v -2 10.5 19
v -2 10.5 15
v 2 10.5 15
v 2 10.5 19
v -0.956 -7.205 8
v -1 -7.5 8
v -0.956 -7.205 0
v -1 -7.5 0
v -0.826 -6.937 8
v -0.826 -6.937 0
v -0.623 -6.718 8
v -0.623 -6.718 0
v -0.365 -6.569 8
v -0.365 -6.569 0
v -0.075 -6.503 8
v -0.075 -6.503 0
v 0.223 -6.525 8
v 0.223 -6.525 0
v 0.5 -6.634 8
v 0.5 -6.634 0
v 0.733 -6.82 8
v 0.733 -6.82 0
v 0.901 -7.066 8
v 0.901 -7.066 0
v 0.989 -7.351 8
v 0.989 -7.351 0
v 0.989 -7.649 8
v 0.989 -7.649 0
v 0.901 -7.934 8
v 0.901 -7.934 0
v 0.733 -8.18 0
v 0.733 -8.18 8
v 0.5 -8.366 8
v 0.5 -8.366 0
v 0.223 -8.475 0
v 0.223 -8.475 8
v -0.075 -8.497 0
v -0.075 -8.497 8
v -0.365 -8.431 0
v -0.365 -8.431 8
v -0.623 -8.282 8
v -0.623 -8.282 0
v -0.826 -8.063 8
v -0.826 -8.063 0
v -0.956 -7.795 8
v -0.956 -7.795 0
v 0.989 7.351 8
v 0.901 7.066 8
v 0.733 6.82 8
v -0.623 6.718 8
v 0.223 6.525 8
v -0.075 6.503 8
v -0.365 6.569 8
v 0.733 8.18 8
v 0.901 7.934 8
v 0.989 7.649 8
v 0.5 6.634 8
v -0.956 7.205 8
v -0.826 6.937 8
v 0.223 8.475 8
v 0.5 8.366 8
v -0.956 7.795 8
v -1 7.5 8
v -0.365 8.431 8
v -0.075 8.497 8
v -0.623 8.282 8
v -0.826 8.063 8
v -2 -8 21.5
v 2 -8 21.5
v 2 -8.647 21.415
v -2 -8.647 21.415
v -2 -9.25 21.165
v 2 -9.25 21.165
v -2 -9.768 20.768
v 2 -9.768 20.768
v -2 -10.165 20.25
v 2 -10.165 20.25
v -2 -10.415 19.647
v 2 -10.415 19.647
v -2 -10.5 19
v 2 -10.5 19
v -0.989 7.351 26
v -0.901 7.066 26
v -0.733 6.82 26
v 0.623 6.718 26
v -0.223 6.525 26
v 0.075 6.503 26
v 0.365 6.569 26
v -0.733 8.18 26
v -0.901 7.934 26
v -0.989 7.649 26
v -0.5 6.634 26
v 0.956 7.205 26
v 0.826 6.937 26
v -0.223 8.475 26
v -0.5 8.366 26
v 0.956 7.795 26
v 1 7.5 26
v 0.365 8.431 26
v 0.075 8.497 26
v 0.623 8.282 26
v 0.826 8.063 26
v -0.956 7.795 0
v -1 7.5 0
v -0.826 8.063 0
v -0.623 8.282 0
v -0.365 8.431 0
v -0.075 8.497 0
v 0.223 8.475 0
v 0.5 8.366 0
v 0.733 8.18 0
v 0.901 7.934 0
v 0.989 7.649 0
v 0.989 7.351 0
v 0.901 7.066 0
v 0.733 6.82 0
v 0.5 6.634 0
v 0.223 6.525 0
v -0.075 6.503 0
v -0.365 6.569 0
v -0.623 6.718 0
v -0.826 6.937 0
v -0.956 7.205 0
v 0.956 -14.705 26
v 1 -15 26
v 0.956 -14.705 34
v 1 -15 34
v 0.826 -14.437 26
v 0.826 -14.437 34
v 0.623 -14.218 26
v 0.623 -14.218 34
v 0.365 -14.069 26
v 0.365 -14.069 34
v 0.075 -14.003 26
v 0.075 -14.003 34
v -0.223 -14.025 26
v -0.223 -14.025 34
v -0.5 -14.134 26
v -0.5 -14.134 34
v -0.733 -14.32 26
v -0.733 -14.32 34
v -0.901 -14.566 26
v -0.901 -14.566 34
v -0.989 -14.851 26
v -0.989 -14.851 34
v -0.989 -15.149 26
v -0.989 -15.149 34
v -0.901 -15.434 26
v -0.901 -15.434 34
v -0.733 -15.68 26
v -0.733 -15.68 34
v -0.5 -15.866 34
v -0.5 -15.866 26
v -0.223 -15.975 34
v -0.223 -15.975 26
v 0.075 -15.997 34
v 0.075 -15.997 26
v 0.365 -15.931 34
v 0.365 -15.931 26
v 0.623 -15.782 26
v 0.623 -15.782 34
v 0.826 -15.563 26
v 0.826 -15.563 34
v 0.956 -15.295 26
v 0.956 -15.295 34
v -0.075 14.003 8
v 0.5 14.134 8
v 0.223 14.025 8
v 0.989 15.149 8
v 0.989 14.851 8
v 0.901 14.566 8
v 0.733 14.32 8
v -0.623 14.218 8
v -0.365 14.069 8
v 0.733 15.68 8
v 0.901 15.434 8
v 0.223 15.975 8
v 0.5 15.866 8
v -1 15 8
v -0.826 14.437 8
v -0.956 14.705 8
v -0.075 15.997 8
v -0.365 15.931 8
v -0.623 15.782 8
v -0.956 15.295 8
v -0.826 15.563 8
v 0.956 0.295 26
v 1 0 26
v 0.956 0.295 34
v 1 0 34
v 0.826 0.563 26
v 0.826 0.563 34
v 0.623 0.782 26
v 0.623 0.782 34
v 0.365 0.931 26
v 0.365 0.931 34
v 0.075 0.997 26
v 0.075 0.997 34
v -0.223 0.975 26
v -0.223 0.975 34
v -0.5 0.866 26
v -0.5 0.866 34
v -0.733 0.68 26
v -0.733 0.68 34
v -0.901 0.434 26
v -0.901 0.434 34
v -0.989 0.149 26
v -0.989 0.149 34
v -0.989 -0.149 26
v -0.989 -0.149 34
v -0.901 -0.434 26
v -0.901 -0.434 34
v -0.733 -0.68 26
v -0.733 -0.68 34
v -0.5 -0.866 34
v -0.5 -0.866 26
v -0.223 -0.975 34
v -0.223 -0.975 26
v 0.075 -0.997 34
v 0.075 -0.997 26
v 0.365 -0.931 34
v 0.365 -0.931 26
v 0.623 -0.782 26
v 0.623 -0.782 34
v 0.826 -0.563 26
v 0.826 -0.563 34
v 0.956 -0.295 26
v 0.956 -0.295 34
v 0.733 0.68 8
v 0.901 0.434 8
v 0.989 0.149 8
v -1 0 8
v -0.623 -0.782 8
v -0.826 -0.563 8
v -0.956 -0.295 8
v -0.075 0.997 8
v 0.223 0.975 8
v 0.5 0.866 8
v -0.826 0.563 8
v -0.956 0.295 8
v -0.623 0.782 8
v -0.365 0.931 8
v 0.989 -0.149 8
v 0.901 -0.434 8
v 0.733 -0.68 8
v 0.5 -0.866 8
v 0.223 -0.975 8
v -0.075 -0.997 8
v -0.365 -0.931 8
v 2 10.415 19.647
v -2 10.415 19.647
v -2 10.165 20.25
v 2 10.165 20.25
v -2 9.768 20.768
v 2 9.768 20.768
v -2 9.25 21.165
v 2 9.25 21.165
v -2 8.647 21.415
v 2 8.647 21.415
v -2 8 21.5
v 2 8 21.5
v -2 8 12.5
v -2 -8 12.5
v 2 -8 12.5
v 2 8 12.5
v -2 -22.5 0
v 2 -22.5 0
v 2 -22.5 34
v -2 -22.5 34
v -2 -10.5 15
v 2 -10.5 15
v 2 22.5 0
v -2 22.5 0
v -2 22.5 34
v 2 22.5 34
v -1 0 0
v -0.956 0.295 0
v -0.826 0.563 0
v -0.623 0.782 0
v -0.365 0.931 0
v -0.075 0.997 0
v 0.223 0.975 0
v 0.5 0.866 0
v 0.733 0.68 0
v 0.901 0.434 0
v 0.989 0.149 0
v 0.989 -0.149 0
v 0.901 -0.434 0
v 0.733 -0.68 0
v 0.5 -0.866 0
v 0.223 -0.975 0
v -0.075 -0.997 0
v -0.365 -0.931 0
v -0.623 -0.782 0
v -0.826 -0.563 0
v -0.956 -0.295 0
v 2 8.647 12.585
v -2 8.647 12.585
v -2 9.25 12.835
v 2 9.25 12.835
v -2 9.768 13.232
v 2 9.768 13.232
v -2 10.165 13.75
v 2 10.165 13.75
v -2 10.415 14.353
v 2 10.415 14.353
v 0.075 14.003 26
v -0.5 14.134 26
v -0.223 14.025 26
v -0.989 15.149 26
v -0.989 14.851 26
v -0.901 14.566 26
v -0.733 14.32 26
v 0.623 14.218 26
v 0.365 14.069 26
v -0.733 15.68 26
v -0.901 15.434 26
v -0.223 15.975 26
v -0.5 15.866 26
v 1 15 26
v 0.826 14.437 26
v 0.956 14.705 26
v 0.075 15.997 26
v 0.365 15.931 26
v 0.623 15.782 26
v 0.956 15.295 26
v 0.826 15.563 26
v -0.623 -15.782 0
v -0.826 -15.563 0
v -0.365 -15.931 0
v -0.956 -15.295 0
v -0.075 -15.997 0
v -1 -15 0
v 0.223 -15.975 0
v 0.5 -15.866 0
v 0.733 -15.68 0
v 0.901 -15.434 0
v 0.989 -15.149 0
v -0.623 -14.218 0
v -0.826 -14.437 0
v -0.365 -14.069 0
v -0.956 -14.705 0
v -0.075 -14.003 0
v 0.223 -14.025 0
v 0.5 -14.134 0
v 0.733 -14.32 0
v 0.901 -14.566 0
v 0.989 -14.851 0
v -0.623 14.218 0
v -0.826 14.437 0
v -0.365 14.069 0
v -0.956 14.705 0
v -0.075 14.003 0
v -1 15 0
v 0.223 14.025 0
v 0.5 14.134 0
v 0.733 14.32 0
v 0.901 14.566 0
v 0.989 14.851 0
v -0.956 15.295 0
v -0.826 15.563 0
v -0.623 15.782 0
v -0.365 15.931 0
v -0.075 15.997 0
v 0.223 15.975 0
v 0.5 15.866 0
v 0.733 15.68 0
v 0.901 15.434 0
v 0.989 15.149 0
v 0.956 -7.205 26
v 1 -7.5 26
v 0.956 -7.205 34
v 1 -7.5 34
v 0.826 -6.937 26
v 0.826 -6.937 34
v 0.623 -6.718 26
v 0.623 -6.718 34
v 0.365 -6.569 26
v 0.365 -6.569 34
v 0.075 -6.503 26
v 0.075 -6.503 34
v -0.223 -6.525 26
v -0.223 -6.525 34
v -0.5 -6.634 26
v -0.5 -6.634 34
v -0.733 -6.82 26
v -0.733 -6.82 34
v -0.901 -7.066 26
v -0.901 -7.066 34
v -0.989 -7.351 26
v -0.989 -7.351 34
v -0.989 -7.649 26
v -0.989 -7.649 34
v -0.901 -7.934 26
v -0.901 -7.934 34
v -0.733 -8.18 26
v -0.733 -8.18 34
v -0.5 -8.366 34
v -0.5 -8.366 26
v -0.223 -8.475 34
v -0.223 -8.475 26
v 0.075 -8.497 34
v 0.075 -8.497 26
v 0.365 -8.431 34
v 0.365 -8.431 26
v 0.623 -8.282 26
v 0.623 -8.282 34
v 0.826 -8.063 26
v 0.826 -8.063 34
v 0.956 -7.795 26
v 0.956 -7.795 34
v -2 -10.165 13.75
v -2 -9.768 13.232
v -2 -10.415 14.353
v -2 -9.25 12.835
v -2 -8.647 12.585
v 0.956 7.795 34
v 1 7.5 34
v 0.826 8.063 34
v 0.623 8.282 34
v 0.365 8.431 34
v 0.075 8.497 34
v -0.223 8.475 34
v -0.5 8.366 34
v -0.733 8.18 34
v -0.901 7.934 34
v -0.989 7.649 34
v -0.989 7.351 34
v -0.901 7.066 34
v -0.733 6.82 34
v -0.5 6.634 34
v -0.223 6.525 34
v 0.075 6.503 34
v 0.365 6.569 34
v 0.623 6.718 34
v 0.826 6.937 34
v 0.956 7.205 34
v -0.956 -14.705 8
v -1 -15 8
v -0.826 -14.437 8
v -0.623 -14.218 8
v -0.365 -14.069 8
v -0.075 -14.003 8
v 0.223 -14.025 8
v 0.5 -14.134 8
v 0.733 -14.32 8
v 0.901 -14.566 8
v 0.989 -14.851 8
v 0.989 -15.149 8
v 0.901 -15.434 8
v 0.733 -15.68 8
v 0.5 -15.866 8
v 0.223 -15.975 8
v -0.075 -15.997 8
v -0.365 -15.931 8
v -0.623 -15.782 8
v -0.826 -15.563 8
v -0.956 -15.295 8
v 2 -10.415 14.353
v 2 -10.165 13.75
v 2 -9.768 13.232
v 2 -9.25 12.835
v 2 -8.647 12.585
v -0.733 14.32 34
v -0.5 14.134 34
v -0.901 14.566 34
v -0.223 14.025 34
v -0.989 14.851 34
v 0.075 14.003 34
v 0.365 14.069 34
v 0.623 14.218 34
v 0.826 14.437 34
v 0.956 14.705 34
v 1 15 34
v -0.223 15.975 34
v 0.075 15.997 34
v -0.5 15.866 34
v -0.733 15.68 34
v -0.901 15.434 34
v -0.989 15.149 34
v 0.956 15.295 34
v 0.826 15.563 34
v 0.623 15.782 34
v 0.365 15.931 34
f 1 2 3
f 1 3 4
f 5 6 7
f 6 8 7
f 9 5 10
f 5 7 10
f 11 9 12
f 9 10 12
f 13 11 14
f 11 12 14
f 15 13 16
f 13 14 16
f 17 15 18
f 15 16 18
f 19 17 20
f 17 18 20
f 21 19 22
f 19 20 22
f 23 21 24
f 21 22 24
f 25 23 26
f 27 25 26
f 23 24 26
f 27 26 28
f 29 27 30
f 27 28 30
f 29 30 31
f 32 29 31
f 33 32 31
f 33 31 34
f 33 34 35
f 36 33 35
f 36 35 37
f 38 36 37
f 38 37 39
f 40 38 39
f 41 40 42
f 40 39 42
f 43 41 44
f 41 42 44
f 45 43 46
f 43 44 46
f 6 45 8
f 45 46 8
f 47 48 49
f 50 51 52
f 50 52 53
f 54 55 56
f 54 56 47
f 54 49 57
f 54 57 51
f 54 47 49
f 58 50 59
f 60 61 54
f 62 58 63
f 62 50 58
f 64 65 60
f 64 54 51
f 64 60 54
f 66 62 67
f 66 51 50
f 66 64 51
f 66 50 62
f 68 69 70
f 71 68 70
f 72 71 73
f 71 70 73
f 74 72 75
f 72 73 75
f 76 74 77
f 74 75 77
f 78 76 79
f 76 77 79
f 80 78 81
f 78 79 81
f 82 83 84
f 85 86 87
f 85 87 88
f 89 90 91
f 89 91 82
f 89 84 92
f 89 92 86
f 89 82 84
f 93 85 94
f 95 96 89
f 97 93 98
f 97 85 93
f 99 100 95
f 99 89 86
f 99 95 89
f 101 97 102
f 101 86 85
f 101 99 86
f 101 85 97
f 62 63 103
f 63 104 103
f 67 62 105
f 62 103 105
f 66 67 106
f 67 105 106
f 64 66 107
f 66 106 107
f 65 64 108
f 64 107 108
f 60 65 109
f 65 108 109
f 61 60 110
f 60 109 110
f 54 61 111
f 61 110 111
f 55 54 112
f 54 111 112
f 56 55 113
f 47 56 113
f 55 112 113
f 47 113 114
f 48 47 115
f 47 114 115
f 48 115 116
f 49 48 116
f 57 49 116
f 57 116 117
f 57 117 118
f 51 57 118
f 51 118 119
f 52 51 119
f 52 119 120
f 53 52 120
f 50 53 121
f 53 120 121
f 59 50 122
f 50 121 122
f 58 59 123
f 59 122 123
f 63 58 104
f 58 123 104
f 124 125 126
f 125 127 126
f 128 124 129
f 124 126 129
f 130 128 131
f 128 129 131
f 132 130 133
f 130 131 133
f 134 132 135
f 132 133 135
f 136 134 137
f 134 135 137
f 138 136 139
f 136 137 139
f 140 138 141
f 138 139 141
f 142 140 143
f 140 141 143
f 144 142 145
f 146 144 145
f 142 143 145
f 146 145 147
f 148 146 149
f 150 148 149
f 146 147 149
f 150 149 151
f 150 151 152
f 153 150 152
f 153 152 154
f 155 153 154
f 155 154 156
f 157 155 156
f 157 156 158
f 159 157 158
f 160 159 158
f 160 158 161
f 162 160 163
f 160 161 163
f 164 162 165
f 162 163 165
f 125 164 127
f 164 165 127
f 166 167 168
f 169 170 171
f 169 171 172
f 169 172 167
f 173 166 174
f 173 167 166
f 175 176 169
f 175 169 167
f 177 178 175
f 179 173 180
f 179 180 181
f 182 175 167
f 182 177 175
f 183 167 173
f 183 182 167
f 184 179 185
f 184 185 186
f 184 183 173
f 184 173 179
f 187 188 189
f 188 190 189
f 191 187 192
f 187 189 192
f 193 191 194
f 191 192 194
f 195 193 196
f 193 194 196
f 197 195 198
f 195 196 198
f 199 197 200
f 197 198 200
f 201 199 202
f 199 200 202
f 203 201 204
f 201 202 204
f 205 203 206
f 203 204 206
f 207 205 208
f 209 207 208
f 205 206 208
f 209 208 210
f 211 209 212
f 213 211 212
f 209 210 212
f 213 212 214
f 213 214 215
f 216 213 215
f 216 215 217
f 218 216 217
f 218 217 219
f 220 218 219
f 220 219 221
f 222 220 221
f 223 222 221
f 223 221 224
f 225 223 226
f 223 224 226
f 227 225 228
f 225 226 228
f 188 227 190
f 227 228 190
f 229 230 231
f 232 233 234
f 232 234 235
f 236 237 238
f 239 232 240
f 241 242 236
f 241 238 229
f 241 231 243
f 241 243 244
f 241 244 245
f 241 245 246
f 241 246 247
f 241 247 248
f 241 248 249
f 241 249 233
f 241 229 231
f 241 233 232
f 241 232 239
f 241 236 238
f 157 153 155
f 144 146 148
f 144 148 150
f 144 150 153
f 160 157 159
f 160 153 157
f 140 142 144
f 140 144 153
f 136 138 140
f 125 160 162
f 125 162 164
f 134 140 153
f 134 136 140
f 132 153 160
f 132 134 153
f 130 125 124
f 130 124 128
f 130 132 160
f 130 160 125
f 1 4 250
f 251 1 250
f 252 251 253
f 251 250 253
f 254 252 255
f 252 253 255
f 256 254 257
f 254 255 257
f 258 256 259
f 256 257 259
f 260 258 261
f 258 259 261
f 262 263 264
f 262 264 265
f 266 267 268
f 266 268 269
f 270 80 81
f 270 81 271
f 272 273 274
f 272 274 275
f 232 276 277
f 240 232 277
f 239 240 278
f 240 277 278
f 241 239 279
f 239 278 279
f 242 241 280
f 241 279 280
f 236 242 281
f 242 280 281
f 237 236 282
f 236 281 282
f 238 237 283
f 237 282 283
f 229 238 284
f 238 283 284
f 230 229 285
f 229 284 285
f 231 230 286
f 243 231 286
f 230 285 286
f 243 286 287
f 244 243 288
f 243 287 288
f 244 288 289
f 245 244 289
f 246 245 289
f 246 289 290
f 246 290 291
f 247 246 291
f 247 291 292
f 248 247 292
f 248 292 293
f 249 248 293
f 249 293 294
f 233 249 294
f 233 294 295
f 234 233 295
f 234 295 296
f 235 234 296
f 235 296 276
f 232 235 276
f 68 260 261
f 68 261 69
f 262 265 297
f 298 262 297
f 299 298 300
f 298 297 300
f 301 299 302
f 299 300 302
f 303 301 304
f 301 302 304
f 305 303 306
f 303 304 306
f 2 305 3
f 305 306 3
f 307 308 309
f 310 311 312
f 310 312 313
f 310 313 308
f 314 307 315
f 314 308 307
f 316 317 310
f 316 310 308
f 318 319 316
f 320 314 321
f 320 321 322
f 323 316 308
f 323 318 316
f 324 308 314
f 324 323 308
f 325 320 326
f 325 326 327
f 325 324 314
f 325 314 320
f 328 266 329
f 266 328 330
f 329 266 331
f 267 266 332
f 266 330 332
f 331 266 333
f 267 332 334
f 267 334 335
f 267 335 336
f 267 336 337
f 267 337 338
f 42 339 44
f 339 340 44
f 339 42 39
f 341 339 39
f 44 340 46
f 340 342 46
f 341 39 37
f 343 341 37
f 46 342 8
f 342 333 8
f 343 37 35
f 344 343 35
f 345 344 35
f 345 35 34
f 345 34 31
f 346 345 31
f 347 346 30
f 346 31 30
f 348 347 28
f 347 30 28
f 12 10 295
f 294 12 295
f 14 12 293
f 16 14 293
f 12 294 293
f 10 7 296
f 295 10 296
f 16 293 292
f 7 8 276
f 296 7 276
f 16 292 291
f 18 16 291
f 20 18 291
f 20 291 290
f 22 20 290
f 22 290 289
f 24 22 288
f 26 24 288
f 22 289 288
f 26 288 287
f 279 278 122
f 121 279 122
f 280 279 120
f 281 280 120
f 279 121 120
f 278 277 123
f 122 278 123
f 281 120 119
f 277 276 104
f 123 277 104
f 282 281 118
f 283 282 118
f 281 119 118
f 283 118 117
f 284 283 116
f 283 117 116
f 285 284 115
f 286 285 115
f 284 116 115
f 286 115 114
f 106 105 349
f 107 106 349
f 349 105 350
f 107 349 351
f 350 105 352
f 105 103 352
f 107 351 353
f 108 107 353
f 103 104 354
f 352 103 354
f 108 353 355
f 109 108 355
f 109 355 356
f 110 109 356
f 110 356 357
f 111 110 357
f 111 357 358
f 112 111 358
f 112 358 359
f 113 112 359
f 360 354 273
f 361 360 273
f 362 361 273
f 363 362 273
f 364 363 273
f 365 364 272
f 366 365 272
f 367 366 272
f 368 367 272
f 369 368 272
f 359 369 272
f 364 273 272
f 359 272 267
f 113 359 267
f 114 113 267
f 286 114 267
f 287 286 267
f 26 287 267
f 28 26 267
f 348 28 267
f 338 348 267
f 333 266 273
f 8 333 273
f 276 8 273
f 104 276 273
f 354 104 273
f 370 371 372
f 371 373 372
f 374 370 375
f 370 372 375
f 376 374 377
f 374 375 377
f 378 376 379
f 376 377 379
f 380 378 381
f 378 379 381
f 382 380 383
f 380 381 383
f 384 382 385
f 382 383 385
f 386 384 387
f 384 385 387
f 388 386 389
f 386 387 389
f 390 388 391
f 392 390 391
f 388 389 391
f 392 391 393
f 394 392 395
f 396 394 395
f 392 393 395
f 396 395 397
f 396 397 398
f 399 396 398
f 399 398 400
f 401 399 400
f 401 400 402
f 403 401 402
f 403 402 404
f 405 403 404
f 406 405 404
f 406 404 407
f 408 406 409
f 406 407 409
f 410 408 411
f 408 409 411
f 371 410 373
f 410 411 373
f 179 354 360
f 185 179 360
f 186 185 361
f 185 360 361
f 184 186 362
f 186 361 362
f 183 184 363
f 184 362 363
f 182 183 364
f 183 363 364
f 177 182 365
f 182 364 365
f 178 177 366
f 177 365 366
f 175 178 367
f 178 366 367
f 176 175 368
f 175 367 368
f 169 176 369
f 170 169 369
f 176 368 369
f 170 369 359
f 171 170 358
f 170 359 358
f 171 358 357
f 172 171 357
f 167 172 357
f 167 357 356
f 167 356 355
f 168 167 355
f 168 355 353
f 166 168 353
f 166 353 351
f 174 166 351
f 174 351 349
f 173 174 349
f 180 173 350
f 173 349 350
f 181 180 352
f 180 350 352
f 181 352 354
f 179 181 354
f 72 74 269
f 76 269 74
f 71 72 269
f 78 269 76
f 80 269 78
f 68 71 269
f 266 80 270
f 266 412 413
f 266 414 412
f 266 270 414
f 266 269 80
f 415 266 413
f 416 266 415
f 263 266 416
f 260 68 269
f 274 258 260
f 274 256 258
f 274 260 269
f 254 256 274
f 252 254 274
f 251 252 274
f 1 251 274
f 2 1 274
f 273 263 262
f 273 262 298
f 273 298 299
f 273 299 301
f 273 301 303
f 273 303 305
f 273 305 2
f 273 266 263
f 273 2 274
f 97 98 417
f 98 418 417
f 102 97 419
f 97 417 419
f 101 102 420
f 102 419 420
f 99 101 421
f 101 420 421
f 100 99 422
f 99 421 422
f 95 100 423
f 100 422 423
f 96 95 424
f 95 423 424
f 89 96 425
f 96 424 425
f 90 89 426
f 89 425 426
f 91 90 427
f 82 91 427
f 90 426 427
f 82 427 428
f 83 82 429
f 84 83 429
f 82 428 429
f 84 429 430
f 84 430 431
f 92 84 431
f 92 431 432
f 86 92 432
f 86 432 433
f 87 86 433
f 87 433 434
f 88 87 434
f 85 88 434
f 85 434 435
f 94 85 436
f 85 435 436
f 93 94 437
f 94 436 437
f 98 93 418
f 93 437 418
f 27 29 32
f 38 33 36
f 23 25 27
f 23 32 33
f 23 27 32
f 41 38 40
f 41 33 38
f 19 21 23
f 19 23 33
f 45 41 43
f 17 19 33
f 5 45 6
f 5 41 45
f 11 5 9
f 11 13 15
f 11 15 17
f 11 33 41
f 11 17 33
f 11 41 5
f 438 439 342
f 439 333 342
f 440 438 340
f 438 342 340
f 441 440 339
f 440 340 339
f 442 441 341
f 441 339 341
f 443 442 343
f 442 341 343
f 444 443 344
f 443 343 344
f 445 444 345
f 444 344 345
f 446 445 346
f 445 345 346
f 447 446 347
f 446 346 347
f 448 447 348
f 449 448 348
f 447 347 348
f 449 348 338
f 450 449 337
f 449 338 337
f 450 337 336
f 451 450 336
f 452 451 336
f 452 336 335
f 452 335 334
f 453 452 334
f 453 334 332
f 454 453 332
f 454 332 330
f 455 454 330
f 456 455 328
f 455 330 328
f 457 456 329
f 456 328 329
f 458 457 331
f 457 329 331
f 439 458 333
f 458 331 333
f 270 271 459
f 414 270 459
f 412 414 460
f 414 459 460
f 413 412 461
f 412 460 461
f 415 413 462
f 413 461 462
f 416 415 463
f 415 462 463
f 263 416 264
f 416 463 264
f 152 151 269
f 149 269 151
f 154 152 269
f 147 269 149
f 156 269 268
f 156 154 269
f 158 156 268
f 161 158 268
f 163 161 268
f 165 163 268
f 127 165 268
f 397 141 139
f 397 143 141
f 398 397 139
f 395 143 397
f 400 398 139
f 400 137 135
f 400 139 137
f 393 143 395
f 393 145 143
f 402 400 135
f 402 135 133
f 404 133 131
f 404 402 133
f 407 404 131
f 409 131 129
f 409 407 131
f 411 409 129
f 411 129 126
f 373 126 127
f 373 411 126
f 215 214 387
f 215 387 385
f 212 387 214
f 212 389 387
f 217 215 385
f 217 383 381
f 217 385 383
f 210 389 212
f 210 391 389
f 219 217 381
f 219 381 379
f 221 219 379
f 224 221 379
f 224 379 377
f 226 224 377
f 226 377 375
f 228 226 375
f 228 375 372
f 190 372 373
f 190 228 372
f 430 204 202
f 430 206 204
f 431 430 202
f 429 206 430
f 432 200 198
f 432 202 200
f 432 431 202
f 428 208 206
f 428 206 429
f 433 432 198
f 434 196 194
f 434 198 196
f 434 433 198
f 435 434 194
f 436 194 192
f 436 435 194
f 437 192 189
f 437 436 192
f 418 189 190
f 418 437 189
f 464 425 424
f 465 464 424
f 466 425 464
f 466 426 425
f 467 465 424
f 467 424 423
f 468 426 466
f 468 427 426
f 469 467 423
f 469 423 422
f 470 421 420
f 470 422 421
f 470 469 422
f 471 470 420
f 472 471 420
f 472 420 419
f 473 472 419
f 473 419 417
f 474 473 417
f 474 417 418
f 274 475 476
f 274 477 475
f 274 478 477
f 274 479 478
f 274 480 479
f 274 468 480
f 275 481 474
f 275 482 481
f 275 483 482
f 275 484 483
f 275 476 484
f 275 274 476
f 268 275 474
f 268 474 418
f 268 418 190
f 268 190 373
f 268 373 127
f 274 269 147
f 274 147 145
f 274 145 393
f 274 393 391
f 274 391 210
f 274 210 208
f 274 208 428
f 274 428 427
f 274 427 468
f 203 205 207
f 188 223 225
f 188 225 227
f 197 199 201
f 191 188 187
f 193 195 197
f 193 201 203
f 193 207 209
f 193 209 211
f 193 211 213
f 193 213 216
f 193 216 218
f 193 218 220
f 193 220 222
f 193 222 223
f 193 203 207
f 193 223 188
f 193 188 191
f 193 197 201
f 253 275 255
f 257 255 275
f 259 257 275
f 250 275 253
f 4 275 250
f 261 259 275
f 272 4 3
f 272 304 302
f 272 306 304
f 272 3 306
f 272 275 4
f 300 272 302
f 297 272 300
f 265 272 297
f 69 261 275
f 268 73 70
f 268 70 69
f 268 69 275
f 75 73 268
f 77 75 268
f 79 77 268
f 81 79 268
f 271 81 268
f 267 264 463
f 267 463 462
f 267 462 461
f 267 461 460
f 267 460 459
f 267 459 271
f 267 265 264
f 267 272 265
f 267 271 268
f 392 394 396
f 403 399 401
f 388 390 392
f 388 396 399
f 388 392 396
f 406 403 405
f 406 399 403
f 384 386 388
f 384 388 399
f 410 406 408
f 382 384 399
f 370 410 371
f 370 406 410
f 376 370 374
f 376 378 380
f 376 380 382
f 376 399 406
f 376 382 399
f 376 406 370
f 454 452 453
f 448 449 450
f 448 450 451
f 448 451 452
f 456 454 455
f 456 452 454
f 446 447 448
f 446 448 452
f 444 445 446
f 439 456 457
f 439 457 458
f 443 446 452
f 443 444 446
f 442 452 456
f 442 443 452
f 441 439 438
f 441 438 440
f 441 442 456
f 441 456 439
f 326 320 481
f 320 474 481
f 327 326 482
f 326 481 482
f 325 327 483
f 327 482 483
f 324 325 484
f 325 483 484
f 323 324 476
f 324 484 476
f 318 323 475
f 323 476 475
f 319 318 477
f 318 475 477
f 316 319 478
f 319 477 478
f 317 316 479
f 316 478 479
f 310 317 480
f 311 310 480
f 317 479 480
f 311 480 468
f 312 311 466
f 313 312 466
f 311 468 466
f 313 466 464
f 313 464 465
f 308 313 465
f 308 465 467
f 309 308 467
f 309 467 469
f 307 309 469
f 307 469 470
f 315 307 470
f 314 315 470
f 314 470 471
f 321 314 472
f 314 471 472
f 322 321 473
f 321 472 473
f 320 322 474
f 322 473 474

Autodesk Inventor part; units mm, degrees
ref_plane "YZ Plane" through (0, 0, 0) normal (1, 0, 0) x (0, 1, 0)
ref_plane "XZ Plane" through (0, 0, 0) normal (0, 1, 0) x (-1, 0, 0)
ref_plane "XY Plane" through (0, 0, 0) normal (0, 0, 1) x (1, 0, 0)
sketch "스케치1" plane through (0, 0, 0) normal (0, 0, 1) x (1, 0, 0)
  line L0 (-2, 22.5) -> (2, 22.5)
  line L1 (2, 22.5) -> (2, -22.5)
  line L2 (2, -22.5) -> (-2, -22.5)
  line L3 (-2, -22.5) -> (-2, 22.5)
  point P0 (0, 0)
  dimension "d0" = 4
  dimension "d1" = 45
  dimension "d2" = 2
  dimension "d3" = 22.5
extrude "돌출1" add sketch "스케치1" along normal blind 34
sketch "스케치2" plane through (0, 0, 34) normal (0, 0, 1) x (1, 0, 0)
  circle A0 centre (0, 15) radius 1
  circle A1 centre (0, 7.5) radius 1
  circle A2 centre (0, -7.5) radius 1
  circle A3 centre (0, -15) radius 1
  line L0 (2, 22.5) -> (-2, 22.5) projected
  line L1 (-2, 22.5) -> (-2, -22.5) projected
  line L2 (-2, -22.5) -> (2, -22.5) projected
  line L3 (2, -22.5) -> (2, 22.5) projected
  circle A4 centre (0, 0) radius 1
  point P0 (0, 0)
  dimension "d6" = 2
  dimension "d7" = 2
  dimension "d8" = 2
  dimension "d9" = 2
  dimension "d11" = 2
  dimension "d12" = 2
  dimension "d13" = 2
  dimension "d14" = 2
  dimension "d17" = 7.5
  dimension "d18" = 7.5
  dimension "d20" = 7.5
  dimension "d21" = 2
  dimension "d22" = 2
  dimension "d23" = 7.5
  dimension "d26" = 7.5
  dimension "d27" = 7.5
extrude "돌출3" cut sketch "스케치2" against normal blind 8 contours A0 | A1 | A2 | A3 | A4
sketch "스케치3" plane through (0, 0, 0) normal (0, 0, -1) x (-1, 0, 0)
  circle A0 centre (0, -15) radius 1 projected
  circle A1 centre (0, 7.5) radius 1 projected
  circle A2 centre (0, 15) radius 1 projected
  circle A3 centre (0, -7.5) radius 1 projected
  circle A4 centre (0, 0) radius 1 projected
  line L0 (-2, 22.5) -> (2, 22.5) projected
  line L1 (2, 22.5) -> (2, -22.5) projected
  line L2 (2, -22.5) -> (-2, -22.5) projected
  line L3 (-2, -22.5) -> (-2, 22.5) projected
  point P0 (0, 0)
extrude "돌출4" cut sketch "스케치3" against normal blind 8 contours A0 | A1 | A2 | A3 | A4
sketch "스케치4" plane through (-2, -22.5, 0) normal (-1, 0, 0) x (0, 0, 1)
  line L0 (0, 0) -> (0, 45) projected
  line L1 (0, 0) -> (34, 0) projected
  line L2 (34, 45) -> (34, 0) projected
  line L3 (0, 45) -> (34, 45) projected
  line L4 (8, 36.5) -> (8, 38.5) projected
  line L5 (26, 38.5) -> (26, 36.5) projected
  line L6 (12.5, 33) -> (21.5, 33)
  line L7 (21.5, 33) -> (21.5, 12)
  line L8 (21.5, 12) -> (12.5, 12)
  line L9 (12.5, 12) -> (12.5, 33)
  point P0 (0, 22.5)
  dimension "d32" = 12
  dimension "d33" = 21
  dimension "d34" = 9
  dimension "d35" = 12.5
  dimension "d36" = 34
  dimension "d37" = 12.5
  dimension "d40" = 45
  dimension "d41" = 12
extrude "돌출5" cut sketch "스케치4" against normal up to surface (4 mm away) contours L6 L7 L8 L9
fillet "모깎기1" radius 2.5 4 edges at (0, 10.5, 12.5) (0, 10.5, 21.5) (0, -10.5, 12.5) (0, -10.5, 21.5)
equation "\"d2\" = 0.5 * d0"
equation "\"d3\" = 0.5 * d1"
equation "\"d35\" = -0.5 * d34 + 0.5 * d36"
properties part number "Box_Side" material "LCP 플라스틱"
